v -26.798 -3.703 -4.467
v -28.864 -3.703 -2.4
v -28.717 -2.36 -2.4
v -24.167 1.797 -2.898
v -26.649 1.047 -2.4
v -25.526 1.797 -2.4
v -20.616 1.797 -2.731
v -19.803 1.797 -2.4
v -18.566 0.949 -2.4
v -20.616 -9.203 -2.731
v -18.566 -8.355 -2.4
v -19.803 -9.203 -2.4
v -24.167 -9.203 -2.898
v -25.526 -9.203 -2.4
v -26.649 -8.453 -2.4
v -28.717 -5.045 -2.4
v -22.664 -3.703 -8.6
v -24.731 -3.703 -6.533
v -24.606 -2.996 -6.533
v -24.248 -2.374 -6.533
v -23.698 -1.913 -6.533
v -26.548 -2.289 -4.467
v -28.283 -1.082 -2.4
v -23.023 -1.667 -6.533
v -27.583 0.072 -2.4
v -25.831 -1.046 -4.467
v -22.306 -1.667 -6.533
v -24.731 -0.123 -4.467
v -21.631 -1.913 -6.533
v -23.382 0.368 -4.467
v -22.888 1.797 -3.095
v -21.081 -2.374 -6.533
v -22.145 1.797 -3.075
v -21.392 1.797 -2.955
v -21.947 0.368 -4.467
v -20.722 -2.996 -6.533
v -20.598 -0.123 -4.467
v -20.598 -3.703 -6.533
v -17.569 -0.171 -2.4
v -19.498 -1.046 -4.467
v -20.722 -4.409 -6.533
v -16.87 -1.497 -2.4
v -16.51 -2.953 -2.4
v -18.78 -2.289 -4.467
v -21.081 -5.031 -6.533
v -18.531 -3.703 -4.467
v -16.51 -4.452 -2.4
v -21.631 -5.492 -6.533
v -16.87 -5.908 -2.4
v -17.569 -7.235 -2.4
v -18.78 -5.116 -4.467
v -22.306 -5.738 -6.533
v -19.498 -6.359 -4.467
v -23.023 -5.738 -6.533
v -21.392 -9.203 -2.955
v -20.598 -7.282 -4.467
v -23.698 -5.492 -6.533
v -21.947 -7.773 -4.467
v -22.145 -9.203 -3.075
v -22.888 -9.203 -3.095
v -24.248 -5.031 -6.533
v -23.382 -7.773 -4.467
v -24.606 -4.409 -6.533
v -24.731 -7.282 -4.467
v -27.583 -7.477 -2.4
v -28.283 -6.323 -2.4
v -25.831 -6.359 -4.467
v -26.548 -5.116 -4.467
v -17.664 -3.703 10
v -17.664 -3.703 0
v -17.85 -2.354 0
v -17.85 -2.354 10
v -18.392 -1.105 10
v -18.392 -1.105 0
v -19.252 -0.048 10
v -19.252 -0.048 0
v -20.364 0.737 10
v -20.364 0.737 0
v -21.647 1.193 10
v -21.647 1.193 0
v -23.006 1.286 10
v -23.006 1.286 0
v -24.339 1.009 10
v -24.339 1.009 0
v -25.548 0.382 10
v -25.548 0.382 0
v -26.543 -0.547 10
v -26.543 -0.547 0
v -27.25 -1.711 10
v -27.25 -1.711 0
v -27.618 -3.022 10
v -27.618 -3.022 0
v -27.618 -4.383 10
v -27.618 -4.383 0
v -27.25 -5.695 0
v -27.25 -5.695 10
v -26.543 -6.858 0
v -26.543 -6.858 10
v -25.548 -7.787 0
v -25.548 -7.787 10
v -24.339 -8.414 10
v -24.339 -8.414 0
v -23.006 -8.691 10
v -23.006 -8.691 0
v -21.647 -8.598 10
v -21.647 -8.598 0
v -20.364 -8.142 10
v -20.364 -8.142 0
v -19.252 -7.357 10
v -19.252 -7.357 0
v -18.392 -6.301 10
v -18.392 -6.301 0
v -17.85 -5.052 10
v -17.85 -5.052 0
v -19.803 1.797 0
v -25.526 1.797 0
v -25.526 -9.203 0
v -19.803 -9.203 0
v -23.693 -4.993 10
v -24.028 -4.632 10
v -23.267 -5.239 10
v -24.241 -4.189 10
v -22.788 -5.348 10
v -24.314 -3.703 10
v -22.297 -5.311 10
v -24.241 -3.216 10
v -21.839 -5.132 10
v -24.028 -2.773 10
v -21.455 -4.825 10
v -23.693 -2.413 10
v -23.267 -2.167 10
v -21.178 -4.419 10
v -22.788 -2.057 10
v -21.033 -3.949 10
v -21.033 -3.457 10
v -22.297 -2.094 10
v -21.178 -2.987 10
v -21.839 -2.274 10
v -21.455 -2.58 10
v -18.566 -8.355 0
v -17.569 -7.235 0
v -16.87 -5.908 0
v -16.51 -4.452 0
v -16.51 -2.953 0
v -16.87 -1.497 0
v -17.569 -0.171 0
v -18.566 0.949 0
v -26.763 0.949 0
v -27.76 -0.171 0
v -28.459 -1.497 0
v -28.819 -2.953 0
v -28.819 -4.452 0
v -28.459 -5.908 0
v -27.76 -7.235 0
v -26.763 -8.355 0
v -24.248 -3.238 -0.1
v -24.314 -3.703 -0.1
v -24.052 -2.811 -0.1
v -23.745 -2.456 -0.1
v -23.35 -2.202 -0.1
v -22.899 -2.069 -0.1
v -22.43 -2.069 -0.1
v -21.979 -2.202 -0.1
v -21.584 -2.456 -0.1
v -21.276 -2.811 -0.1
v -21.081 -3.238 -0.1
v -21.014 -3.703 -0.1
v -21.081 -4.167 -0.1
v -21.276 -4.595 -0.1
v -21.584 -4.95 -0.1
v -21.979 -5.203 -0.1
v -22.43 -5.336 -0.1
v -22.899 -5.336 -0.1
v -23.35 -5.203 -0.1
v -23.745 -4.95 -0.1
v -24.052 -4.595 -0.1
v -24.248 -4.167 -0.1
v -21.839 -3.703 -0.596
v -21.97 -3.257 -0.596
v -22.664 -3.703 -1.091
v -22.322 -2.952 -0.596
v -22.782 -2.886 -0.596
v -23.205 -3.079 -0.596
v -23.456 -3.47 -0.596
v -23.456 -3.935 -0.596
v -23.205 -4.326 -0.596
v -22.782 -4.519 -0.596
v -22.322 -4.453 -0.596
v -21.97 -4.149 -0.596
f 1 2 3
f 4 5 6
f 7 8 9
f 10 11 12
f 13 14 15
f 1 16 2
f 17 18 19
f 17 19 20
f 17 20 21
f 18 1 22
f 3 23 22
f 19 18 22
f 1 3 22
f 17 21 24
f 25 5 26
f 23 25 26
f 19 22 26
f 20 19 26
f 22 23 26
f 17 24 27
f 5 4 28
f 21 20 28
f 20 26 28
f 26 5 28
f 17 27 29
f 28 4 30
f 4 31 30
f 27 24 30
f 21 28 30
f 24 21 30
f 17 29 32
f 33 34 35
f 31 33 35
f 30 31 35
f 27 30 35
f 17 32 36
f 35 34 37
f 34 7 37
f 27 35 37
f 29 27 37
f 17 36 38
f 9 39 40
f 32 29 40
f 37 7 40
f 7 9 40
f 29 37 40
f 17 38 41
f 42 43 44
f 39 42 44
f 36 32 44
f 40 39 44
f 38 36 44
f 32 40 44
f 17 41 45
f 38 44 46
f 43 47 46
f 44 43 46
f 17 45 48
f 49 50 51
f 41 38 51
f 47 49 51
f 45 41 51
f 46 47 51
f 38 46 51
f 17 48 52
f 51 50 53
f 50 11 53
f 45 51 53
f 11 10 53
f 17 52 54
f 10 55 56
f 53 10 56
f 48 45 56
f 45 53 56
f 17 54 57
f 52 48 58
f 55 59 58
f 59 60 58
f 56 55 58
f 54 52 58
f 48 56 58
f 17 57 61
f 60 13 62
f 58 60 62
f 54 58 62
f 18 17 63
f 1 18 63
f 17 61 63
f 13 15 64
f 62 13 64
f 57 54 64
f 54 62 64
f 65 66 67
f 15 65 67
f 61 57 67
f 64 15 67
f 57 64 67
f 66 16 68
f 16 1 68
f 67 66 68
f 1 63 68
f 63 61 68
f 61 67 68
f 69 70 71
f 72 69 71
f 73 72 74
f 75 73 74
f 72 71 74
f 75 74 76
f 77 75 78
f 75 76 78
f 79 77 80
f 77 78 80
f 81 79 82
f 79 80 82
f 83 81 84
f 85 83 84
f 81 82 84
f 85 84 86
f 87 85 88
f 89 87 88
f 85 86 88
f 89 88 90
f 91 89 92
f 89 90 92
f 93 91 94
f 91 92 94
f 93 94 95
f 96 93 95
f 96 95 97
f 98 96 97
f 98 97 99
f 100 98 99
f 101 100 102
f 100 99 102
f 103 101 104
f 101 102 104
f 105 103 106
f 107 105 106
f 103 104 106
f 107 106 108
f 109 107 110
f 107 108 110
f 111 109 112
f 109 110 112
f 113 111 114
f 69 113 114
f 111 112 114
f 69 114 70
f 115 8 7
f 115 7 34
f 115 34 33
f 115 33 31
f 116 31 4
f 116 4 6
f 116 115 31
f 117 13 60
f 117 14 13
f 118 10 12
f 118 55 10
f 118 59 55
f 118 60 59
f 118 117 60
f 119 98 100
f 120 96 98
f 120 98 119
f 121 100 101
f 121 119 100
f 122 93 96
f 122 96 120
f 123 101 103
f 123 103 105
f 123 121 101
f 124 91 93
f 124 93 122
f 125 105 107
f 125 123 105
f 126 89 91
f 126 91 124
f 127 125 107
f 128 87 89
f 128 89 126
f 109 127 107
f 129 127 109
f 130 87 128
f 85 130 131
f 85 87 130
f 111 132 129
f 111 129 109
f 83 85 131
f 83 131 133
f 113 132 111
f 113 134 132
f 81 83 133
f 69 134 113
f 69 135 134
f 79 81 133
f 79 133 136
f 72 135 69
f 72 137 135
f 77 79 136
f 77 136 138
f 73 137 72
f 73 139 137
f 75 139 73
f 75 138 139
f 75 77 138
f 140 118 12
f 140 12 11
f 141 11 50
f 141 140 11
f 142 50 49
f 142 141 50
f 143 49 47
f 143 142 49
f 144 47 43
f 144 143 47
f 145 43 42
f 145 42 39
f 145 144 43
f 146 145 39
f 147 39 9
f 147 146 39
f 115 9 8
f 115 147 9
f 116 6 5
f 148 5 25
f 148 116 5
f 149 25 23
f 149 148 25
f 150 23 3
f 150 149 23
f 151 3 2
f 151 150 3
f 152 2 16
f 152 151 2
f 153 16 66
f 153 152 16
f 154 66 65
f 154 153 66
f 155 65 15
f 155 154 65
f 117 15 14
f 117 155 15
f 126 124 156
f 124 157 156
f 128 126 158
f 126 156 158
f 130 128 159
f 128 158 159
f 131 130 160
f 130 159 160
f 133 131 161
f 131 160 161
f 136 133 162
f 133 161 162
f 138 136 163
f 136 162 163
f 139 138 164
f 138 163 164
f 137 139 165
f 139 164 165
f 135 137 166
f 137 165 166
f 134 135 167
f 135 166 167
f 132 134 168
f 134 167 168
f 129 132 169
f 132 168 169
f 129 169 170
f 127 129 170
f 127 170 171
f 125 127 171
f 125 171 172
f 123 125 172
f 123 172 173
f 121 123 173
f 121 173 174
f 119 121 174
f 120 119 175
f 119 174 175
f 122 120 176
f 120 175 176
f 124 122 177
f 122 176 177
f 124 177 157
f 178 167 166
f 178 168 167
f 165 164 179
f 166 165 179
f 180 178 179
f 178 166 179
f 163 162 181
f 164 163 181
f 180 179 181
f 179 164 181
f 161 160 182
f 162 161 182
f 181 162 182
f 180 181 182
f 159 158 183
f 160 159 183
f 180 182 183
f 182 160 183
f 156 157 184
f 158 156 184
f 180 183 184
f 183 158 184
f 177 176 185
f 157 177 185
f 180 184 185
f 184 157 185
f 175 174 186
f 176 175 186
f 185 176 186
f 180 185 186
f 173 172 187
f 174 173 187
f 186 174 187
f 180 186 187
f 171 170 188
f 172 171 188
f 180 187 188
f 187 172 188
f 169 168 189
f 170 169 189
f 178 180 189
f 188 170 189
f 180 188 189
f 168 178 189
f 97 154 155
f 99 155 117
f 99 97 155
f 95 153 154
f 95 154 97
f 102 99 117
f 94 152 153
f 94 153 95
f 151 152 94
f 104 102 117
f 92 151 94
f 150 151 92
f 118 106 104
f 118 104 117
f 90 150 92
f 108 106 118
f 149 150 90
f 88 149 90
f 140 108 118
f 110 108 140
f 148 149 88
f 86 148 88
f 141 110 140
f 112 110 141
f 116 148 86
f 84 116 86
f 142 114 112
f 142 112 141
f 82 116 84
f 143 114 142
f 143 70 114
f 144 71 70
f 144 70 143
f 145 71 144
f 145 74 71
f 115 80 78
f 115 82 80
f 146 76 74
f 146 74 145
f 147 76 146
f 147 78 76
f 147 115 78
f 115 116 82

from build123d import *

# Parameters (mm, degrees)
SKETCH1_R                 = 5
BOSS_EXTRUDE1_DEPTH       = 10
BOSS_EXTRUDE3_DEPTH       = 2.4
SKETCH15_W                = 6.028380363
SKETCH15_H                = 2.991132054
CUT_EXTRUDE1_DEPTH        = 2.4
SKETCH16_W                = 6.590795167
SKETCH16_H                = 1.091372194
CUT_EXTRUDE3_DEPTH        = 2.4
M4X0_7_TAPPED_HOLE1_D     = 3.3
M4X0_7_TAPPED_HOLE1_DEPTH = 10.1
M4X0_7_TAPPED_HOLE1_TIP   = 0.991420021


with BuildPart() as part:
    # Sketch1 → Boss-Extrude1 (new body)
    with BuildSketch(Plane.XY):
        with Locations((-22.664426825, -3.702604382)):
            Circle(SKETCH1_R)
    extrude(amount=BOSS_EXTRUDE1_DEPTH)

    # Sketch2 → Boss-Extrude3 (add)
    with BuildSketch(Plane(origin=(0, 0, 0), x_dir=(-1, 0, 0), z_dir=(0, 0, -1))):
        with BuildLine():
            Line((25.526244429, -9.202604382), (19.80260922, -9.202604382))
            ThreePointArc((19.80260922, -9.202604382), (16.464426825, -3.702604382), (19.80260922, 1.797395618))
            Line((19.80260922, 1.797395618), (25.526244429, 1.797395618))
            ThreePointArc((25.526244429, 1.797395618), (28.864426825, -3.702604382), (25.526244429, -9.202604382))
        make_face()
    extrude(amount=BOSS_EXTRUDE3_DEPTH)

    # Sketch13 → Revolve1 (revolve)
    with BuildSketch(Plane(origin=(0, -3.702604382, 0), x_dir=(1, 0, 0), z_dir=(0, 1, 0)), mode=Mode.PRIVATE) as revolve1_sk:
        Polygon((-16.464426825, 2.4), (-22.664426825, 2.4), (-22.664426825, 8.6), align=None)
    revolve(revolve1_sk.sketch.rotate(Axis((-22.664426825, -3.702604382, -2.4), (0, 0, -1)), 180), axis=Axis((-22.664426825, -3.702604382, -2.4), (0, 0, -1)))

    # Sketch15 → Cut-Extrude1 (cut)
    with BuildSketch(Plane.XY.offset(-2.4)):
        with Locations((-22.512054248, 3.292961645)):
            Rectangle(SKETCH15_W, SKETCH15_H)
    extrude(amount=-CUT_EXTRUDE1_DEPTH, mode=Mode.SUBTRACT)

    # Sketch16 → Cut-Extrude3 (cut)
    with BuildSketch(Plane.XY.offset(-2.4)):
        with Locations((-23.098006803, -9.748290479)):
            Rectangle(SKETCH16_W, SKETCH16_H)
    extrude(amount=-CUT_EXTRUDE3_DEPTH, mode=Mode.SUBTRACT)

    # M4x0.7 Tapped Hole1
    with Locations(Plane.XY.offset(10)):
        with Locations((-22.664426825, -3.702604382)):
            Hole(M4X0_7_TAPPED_HOLE1_D / 2, depth=M4X0_7_TAPPED_HOLE1_DEPTH)
            with Locations((0, 0, -(M4X0_7_TAPPED_HOLE1_DEPTH + M4X0_7_TAPPED_HOLE1_TIP / 2))):  # 118° drill point
                Cone(0, M4X0_7_TAPPED_HOLE1_D / 2, M4X0_7_TAPPED_HOLE1_TIP, mode=Mode.SUBTRACT)


solid = part.part
